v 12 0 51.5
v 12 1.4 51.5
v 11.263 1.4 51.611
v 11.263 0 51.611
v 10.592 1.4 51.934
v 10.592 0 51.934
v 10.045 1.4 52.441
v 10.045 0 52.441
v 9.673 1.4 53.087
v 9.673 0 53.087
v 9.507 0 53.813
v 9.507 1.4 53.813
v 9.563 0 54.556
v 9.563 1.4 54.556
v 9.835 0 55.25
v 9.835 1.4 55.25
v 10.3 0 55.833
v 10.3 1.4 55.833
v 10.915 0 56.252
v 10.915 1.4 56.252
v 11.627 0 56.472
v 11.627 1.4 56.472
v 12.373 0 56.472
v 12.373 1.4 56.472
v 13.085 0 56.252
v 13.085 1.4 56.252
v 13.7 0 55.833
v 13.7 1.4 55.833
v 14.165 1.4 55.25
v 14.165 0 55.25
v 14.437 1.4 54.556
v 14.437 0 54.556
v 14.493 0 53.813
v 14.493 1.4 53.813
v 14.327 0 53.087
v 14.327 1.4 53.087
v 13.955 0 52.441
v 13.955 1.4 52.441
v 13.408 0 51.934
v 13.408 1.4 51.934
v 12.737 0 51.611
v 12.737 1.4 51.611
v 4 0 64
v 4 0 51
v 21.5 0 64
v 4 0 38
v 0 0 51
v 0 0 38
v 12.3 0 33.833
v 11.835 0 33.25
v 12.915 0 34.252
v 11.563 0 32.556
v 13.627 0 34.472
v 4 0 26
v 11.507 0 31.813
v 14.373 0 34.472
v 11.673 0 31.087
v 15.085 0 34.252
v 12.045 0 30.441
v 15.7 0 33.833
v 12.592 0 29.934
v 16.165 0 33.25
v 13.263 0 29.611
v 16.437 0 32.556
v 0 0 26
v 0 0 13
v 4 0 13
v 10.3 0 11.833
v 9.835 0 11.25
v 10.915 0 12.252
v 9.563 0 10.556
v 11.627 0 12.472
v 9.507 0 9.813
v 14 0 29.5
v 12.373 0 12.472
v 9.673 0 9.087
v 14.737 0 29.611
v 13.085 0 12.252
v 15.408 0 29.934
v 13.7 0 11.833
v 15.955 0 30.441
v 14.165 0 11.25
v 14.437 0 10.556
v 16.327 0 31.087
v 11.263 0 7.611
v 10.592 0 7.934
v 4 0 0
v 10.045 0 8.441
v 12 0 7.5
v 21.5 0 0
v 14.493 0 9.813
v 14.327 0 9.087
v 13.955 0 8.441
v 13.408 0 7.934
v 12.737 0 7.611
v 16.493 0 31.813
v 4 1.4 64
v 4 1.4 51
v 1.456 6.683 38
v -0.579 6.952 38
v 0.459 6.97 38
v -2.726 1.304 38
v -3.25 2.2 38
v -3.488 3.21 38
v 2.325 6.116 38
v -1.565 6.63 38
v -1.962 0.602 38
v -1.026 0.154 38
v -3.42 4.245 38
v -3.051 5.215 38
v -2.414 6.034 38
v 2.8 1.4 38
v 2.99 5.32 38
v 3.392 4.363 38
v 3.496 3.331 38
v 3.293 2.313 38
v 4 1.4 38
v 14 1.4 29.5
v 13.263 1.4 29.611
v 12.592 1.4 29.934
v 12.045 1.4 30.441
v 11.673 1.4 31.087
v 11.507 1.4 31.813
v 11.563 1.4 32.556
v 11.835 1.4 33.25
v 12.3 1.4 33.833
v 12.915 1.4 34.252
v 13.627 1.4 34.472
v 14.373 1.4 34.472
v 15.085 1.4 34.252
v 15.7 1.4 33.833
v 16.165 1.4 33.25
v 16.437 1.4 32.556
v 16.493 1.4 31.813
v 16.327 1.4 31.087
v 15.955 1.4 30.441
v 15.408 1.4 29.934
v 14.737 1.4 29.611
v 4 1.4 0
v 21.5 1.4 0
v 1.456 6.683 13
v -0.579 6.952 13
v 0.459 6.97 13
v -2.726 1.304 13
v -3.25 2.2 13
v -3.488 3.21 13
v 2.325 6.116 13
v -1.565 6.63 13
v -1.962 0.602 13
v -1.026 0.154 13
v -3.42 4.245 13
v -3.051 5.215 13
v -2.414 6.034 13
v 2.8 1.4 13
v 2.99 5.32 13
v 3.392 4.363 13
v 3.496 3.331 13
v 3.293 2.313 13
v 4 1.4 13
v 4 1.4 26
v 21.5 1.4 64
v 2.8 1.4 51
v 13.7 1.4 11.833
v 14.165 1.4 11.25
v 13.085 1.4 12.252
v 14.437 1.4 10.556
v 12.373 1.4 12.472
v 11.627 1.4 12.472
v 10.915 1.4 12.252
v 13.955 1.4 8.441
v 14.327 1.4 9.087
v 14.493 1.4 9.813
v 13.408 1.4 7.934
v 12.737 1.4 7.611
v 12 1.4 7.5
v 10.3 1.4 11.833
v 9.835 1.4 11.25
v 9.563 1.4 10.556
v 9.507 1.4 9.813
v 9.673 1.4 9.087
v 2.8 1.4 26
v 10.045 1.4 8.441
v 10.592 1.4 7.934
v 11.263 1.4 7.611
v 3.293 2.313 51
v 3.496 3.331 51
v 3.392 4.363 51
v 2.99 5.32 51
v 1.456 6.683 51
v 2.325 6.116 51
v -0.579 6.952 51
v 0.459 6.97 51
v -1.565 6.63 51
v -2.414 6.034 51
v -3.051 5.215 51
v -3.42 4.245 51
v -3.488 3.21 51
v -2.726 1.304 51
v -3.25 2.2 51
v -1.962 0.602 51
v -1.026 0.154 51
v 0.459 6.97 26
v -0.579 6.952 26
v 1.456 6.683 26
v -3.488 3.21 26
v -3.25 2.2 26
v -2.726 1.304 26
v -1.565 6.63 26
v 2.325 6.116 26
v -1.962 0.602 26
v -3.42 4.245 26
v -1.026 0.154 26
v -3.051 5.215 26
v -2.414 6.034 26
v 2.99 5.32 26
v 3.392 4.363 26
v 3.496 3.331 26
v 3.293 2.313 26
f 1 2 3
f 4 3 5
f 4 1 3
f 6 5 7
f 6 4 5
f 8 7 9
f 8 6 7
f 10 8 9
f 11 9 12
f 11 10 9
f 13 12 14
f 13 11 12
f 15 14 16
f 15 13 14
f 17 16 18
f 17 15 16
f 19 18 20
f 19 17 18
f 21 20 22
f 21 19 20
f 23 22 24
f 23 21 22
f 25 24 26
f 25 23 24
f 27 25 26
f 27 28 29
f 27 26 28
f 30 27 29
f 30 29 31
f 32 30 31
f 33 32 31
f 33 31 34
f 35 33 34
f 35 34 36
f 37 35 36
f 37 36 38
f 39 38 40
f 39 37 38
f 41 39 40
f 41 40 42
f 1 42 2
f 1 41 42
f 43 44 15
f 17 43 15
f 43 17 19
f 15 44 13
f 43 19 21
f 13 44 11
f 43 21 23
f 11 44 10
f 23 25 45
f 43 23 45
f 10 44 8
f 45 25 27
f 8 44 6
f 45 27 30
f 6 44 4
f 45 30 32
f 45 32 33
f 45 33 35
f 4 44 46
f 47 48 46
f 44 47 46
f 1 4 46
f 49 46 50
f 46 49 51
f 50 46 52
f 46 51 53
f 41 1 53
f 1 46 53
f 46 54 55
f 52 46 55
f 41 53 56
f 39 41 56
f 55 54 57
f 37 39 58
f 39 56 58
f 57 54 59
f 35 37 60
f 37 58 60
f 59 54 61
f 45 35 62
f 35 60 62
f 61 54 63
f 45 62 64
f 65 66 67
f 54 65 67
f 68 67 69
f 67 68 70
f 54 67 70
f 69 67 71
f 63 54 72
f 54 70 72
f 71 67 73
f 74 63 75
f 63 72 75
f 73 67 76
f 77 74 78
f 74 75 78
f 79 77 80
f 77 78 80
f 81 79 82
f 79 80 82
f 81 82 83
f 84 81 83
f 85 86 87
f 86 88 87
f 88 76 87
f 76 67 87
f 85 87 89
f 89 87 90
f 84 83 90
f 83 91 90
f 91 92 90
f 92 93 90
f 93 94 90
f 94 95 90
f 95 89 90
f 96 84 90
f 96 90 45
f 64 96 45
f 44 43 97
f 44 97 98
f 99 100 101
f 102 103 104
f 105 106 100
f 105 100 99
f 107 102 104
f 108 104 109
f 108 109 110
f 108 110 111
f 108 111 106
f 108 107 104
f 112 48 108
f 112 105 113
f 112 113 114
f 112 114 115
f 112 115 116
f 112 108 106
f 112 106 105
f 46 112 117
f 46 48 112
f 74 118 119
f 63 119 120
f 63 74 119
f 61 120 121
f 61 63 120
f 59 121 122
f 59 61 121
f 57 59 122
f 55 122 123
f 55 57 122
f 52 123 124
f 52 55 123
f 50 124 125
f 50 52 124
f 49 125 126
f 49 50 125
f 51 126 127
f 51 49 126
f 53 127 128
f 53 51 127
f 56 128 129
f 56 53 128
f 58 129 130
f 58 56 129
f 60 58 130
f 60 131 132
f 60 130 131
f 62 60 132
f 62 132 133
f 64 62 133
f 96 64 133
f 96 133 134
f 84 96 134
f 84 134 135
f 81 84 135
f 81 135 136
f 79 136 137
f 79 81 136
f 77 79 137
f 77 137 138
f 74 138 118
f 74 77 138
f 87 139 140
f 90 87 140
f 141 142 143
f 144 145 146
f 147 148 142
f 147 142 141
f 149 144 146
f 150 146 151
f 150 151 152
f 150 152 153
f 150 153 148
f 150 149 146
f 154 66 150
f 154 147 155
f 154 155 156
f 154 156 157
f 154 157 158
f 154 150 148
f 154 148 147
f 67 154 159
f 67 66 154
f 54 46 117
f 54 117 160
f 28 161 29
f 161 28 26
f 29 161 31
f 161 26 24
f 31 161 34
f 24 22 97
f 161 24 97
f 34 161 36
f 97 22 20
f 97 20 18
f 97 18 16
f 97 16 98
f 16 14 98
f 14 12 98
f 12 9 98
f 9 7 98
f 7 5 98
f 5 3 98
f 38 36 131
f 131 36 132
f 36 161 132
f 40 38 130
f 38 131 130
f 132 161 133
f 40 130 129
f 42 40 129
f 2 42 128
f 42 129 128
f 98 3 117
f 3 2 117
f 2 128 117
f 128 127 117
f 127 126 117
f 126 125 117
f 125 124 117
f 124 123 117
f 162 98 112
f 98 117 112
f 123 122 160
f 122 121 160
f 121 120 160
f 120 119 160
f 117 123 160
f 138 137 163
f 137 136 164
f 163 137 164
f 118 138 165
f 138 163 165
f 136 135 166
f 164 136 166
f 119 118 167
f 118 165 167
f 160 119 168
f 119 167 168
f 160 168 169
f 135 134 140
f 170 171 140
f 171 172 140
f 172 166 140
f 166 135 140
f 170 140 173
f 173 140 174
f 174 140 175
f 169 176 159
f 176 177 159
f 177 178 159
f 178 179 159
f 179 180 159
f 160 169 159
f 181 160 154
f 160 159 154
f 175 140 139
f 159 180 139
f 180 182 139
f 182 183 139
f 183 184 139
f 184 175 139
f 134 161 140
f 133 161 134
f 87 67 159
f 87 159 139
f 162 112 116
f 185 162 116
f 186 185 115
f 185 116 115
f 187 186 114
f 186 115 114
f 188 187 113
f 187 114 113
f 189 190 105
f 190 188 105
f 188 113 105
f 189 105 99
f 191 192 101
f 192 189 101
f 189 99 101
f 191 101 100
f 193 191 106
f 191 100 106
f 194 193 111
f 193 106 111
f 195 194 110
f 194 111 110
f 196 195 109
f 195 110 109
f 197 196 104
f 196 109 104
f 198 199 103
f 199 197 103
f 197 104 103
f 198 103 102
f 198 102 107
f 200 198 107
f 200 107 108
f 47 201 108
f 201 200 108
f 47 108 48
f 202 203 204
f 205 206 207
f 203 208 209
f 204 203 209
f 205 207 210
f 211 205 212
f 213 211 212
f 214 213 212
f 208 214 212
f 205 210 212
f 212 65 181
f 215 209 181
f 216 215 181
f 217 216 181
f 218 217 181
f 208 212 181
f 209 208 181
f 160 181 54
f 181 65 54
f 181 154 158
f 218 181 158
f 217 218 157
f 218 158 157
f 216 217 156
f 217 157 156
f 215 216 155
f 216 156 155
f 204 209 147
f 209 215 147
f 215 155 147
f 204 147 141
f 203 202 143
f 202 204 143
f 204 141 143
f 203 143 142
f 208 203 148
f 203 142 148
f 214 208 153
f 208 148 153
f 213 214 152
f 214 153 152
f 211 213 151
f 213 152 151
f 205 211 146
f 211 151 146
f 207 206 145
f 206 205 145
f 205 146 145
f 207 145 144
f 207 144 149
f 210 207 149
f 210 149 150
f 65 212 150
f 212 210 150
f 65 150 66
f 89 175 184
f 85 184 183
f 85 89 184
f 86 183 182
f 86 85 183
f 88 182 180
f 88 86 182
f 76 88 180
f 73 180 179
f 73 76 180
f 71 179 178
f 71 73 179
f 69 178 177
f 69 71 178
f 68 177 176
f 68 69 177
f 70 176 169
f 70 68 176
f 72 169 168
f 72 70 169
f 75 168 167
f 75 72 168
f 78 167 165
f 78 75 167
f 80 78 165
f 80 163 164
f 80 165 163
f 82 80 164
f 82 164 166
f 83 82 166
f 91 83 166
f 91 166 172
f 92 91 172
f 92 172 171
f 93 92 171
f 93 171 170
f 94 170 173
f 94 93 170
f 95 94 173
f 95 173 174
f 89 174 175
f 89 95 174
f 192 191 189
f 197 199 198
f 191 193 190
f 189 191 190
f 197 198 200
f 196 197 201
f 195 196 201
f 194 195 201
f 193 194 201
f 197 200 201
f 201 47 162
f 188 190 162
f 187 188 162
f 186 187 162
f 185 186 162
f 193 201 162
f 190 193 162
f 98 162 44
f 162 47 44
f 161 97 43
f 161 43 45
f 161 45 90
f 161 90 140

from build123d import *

# Parameters (mm, degrees)
BOSS_EXTRUDE1_DEPTH = 64
SKETCH2_R           = 2.499999953
CUT_EXTRUDE2_DEPTH  = 5
SKETCH3_W           = 8
SKETCH3_H           = 13
SKETCH3_H_2         = 12
CUT_EXTRUDE3_DEPTH  = 15


with BuildPart() as part:
    # Sketch1 → Boss-Extrude1 (new body)
    with BuildSketch(Plane.XY):
        with BuildLine():
            Line((0, 0), (21.499999926, 0))
            Line((21.499999926, 0), (21.499999926, 1.4))
            Line((21.499999926, 1.4), (2.799999992, 1.4))
            ThreePointArc((2.799999992, 1.4), (-1.565247581, 6.630495138), (0, 0))
        make_face()
    extrude(amount=BOSS_EXTRUDE1_DEPTH)

    # Sketch2 → Cut-Extrude2 (cut)
    with BuildSketch(Plane(origin=(0, 0, 0), x_dir=(1, 0, 0), z_dir=(0, 1, 0))):
        with Locations(Location((11.999999876, -53.99999995, 0), (0, 0, 90))):
            Circle(SKETCH2_R)
        with Locations(Location((13.999999876, -32.000000008, 0), (0, 0, 90))):
            Circle(SKETCH2_R)
        with Locations(Location((11.999999876, -10.000000066, 0), (0, 0, 90))):
            Circle(SKETCH2_R)
    extrude(amount=CUT_EXTRUDE2_DEPTH, mode=Mode.SUBTRACT)

    # Sketch3 → Cut-Extrude3 (cut)
    with BuildSketch(Plane(origin=(0, 0, 0), x_dir=(1, 0, 0), z_dir=(0, 1, 0))):
        with Locations((0, -6.5)):
            Rectangle(SKETCH3_W, SKETCH3_H)
        with Locations((0, -32)):
            Rectangle(SKETCH3_W, SKETCH3_H_2)
        with Locations((0, -57.5)):
            Rectangle(SKETCH3_W, SKETCH3_H)
    extrude(amount=CUT_EXTRUDE3_DEPTH, mode=Mode.SUBTRACT)


solid = part.part
